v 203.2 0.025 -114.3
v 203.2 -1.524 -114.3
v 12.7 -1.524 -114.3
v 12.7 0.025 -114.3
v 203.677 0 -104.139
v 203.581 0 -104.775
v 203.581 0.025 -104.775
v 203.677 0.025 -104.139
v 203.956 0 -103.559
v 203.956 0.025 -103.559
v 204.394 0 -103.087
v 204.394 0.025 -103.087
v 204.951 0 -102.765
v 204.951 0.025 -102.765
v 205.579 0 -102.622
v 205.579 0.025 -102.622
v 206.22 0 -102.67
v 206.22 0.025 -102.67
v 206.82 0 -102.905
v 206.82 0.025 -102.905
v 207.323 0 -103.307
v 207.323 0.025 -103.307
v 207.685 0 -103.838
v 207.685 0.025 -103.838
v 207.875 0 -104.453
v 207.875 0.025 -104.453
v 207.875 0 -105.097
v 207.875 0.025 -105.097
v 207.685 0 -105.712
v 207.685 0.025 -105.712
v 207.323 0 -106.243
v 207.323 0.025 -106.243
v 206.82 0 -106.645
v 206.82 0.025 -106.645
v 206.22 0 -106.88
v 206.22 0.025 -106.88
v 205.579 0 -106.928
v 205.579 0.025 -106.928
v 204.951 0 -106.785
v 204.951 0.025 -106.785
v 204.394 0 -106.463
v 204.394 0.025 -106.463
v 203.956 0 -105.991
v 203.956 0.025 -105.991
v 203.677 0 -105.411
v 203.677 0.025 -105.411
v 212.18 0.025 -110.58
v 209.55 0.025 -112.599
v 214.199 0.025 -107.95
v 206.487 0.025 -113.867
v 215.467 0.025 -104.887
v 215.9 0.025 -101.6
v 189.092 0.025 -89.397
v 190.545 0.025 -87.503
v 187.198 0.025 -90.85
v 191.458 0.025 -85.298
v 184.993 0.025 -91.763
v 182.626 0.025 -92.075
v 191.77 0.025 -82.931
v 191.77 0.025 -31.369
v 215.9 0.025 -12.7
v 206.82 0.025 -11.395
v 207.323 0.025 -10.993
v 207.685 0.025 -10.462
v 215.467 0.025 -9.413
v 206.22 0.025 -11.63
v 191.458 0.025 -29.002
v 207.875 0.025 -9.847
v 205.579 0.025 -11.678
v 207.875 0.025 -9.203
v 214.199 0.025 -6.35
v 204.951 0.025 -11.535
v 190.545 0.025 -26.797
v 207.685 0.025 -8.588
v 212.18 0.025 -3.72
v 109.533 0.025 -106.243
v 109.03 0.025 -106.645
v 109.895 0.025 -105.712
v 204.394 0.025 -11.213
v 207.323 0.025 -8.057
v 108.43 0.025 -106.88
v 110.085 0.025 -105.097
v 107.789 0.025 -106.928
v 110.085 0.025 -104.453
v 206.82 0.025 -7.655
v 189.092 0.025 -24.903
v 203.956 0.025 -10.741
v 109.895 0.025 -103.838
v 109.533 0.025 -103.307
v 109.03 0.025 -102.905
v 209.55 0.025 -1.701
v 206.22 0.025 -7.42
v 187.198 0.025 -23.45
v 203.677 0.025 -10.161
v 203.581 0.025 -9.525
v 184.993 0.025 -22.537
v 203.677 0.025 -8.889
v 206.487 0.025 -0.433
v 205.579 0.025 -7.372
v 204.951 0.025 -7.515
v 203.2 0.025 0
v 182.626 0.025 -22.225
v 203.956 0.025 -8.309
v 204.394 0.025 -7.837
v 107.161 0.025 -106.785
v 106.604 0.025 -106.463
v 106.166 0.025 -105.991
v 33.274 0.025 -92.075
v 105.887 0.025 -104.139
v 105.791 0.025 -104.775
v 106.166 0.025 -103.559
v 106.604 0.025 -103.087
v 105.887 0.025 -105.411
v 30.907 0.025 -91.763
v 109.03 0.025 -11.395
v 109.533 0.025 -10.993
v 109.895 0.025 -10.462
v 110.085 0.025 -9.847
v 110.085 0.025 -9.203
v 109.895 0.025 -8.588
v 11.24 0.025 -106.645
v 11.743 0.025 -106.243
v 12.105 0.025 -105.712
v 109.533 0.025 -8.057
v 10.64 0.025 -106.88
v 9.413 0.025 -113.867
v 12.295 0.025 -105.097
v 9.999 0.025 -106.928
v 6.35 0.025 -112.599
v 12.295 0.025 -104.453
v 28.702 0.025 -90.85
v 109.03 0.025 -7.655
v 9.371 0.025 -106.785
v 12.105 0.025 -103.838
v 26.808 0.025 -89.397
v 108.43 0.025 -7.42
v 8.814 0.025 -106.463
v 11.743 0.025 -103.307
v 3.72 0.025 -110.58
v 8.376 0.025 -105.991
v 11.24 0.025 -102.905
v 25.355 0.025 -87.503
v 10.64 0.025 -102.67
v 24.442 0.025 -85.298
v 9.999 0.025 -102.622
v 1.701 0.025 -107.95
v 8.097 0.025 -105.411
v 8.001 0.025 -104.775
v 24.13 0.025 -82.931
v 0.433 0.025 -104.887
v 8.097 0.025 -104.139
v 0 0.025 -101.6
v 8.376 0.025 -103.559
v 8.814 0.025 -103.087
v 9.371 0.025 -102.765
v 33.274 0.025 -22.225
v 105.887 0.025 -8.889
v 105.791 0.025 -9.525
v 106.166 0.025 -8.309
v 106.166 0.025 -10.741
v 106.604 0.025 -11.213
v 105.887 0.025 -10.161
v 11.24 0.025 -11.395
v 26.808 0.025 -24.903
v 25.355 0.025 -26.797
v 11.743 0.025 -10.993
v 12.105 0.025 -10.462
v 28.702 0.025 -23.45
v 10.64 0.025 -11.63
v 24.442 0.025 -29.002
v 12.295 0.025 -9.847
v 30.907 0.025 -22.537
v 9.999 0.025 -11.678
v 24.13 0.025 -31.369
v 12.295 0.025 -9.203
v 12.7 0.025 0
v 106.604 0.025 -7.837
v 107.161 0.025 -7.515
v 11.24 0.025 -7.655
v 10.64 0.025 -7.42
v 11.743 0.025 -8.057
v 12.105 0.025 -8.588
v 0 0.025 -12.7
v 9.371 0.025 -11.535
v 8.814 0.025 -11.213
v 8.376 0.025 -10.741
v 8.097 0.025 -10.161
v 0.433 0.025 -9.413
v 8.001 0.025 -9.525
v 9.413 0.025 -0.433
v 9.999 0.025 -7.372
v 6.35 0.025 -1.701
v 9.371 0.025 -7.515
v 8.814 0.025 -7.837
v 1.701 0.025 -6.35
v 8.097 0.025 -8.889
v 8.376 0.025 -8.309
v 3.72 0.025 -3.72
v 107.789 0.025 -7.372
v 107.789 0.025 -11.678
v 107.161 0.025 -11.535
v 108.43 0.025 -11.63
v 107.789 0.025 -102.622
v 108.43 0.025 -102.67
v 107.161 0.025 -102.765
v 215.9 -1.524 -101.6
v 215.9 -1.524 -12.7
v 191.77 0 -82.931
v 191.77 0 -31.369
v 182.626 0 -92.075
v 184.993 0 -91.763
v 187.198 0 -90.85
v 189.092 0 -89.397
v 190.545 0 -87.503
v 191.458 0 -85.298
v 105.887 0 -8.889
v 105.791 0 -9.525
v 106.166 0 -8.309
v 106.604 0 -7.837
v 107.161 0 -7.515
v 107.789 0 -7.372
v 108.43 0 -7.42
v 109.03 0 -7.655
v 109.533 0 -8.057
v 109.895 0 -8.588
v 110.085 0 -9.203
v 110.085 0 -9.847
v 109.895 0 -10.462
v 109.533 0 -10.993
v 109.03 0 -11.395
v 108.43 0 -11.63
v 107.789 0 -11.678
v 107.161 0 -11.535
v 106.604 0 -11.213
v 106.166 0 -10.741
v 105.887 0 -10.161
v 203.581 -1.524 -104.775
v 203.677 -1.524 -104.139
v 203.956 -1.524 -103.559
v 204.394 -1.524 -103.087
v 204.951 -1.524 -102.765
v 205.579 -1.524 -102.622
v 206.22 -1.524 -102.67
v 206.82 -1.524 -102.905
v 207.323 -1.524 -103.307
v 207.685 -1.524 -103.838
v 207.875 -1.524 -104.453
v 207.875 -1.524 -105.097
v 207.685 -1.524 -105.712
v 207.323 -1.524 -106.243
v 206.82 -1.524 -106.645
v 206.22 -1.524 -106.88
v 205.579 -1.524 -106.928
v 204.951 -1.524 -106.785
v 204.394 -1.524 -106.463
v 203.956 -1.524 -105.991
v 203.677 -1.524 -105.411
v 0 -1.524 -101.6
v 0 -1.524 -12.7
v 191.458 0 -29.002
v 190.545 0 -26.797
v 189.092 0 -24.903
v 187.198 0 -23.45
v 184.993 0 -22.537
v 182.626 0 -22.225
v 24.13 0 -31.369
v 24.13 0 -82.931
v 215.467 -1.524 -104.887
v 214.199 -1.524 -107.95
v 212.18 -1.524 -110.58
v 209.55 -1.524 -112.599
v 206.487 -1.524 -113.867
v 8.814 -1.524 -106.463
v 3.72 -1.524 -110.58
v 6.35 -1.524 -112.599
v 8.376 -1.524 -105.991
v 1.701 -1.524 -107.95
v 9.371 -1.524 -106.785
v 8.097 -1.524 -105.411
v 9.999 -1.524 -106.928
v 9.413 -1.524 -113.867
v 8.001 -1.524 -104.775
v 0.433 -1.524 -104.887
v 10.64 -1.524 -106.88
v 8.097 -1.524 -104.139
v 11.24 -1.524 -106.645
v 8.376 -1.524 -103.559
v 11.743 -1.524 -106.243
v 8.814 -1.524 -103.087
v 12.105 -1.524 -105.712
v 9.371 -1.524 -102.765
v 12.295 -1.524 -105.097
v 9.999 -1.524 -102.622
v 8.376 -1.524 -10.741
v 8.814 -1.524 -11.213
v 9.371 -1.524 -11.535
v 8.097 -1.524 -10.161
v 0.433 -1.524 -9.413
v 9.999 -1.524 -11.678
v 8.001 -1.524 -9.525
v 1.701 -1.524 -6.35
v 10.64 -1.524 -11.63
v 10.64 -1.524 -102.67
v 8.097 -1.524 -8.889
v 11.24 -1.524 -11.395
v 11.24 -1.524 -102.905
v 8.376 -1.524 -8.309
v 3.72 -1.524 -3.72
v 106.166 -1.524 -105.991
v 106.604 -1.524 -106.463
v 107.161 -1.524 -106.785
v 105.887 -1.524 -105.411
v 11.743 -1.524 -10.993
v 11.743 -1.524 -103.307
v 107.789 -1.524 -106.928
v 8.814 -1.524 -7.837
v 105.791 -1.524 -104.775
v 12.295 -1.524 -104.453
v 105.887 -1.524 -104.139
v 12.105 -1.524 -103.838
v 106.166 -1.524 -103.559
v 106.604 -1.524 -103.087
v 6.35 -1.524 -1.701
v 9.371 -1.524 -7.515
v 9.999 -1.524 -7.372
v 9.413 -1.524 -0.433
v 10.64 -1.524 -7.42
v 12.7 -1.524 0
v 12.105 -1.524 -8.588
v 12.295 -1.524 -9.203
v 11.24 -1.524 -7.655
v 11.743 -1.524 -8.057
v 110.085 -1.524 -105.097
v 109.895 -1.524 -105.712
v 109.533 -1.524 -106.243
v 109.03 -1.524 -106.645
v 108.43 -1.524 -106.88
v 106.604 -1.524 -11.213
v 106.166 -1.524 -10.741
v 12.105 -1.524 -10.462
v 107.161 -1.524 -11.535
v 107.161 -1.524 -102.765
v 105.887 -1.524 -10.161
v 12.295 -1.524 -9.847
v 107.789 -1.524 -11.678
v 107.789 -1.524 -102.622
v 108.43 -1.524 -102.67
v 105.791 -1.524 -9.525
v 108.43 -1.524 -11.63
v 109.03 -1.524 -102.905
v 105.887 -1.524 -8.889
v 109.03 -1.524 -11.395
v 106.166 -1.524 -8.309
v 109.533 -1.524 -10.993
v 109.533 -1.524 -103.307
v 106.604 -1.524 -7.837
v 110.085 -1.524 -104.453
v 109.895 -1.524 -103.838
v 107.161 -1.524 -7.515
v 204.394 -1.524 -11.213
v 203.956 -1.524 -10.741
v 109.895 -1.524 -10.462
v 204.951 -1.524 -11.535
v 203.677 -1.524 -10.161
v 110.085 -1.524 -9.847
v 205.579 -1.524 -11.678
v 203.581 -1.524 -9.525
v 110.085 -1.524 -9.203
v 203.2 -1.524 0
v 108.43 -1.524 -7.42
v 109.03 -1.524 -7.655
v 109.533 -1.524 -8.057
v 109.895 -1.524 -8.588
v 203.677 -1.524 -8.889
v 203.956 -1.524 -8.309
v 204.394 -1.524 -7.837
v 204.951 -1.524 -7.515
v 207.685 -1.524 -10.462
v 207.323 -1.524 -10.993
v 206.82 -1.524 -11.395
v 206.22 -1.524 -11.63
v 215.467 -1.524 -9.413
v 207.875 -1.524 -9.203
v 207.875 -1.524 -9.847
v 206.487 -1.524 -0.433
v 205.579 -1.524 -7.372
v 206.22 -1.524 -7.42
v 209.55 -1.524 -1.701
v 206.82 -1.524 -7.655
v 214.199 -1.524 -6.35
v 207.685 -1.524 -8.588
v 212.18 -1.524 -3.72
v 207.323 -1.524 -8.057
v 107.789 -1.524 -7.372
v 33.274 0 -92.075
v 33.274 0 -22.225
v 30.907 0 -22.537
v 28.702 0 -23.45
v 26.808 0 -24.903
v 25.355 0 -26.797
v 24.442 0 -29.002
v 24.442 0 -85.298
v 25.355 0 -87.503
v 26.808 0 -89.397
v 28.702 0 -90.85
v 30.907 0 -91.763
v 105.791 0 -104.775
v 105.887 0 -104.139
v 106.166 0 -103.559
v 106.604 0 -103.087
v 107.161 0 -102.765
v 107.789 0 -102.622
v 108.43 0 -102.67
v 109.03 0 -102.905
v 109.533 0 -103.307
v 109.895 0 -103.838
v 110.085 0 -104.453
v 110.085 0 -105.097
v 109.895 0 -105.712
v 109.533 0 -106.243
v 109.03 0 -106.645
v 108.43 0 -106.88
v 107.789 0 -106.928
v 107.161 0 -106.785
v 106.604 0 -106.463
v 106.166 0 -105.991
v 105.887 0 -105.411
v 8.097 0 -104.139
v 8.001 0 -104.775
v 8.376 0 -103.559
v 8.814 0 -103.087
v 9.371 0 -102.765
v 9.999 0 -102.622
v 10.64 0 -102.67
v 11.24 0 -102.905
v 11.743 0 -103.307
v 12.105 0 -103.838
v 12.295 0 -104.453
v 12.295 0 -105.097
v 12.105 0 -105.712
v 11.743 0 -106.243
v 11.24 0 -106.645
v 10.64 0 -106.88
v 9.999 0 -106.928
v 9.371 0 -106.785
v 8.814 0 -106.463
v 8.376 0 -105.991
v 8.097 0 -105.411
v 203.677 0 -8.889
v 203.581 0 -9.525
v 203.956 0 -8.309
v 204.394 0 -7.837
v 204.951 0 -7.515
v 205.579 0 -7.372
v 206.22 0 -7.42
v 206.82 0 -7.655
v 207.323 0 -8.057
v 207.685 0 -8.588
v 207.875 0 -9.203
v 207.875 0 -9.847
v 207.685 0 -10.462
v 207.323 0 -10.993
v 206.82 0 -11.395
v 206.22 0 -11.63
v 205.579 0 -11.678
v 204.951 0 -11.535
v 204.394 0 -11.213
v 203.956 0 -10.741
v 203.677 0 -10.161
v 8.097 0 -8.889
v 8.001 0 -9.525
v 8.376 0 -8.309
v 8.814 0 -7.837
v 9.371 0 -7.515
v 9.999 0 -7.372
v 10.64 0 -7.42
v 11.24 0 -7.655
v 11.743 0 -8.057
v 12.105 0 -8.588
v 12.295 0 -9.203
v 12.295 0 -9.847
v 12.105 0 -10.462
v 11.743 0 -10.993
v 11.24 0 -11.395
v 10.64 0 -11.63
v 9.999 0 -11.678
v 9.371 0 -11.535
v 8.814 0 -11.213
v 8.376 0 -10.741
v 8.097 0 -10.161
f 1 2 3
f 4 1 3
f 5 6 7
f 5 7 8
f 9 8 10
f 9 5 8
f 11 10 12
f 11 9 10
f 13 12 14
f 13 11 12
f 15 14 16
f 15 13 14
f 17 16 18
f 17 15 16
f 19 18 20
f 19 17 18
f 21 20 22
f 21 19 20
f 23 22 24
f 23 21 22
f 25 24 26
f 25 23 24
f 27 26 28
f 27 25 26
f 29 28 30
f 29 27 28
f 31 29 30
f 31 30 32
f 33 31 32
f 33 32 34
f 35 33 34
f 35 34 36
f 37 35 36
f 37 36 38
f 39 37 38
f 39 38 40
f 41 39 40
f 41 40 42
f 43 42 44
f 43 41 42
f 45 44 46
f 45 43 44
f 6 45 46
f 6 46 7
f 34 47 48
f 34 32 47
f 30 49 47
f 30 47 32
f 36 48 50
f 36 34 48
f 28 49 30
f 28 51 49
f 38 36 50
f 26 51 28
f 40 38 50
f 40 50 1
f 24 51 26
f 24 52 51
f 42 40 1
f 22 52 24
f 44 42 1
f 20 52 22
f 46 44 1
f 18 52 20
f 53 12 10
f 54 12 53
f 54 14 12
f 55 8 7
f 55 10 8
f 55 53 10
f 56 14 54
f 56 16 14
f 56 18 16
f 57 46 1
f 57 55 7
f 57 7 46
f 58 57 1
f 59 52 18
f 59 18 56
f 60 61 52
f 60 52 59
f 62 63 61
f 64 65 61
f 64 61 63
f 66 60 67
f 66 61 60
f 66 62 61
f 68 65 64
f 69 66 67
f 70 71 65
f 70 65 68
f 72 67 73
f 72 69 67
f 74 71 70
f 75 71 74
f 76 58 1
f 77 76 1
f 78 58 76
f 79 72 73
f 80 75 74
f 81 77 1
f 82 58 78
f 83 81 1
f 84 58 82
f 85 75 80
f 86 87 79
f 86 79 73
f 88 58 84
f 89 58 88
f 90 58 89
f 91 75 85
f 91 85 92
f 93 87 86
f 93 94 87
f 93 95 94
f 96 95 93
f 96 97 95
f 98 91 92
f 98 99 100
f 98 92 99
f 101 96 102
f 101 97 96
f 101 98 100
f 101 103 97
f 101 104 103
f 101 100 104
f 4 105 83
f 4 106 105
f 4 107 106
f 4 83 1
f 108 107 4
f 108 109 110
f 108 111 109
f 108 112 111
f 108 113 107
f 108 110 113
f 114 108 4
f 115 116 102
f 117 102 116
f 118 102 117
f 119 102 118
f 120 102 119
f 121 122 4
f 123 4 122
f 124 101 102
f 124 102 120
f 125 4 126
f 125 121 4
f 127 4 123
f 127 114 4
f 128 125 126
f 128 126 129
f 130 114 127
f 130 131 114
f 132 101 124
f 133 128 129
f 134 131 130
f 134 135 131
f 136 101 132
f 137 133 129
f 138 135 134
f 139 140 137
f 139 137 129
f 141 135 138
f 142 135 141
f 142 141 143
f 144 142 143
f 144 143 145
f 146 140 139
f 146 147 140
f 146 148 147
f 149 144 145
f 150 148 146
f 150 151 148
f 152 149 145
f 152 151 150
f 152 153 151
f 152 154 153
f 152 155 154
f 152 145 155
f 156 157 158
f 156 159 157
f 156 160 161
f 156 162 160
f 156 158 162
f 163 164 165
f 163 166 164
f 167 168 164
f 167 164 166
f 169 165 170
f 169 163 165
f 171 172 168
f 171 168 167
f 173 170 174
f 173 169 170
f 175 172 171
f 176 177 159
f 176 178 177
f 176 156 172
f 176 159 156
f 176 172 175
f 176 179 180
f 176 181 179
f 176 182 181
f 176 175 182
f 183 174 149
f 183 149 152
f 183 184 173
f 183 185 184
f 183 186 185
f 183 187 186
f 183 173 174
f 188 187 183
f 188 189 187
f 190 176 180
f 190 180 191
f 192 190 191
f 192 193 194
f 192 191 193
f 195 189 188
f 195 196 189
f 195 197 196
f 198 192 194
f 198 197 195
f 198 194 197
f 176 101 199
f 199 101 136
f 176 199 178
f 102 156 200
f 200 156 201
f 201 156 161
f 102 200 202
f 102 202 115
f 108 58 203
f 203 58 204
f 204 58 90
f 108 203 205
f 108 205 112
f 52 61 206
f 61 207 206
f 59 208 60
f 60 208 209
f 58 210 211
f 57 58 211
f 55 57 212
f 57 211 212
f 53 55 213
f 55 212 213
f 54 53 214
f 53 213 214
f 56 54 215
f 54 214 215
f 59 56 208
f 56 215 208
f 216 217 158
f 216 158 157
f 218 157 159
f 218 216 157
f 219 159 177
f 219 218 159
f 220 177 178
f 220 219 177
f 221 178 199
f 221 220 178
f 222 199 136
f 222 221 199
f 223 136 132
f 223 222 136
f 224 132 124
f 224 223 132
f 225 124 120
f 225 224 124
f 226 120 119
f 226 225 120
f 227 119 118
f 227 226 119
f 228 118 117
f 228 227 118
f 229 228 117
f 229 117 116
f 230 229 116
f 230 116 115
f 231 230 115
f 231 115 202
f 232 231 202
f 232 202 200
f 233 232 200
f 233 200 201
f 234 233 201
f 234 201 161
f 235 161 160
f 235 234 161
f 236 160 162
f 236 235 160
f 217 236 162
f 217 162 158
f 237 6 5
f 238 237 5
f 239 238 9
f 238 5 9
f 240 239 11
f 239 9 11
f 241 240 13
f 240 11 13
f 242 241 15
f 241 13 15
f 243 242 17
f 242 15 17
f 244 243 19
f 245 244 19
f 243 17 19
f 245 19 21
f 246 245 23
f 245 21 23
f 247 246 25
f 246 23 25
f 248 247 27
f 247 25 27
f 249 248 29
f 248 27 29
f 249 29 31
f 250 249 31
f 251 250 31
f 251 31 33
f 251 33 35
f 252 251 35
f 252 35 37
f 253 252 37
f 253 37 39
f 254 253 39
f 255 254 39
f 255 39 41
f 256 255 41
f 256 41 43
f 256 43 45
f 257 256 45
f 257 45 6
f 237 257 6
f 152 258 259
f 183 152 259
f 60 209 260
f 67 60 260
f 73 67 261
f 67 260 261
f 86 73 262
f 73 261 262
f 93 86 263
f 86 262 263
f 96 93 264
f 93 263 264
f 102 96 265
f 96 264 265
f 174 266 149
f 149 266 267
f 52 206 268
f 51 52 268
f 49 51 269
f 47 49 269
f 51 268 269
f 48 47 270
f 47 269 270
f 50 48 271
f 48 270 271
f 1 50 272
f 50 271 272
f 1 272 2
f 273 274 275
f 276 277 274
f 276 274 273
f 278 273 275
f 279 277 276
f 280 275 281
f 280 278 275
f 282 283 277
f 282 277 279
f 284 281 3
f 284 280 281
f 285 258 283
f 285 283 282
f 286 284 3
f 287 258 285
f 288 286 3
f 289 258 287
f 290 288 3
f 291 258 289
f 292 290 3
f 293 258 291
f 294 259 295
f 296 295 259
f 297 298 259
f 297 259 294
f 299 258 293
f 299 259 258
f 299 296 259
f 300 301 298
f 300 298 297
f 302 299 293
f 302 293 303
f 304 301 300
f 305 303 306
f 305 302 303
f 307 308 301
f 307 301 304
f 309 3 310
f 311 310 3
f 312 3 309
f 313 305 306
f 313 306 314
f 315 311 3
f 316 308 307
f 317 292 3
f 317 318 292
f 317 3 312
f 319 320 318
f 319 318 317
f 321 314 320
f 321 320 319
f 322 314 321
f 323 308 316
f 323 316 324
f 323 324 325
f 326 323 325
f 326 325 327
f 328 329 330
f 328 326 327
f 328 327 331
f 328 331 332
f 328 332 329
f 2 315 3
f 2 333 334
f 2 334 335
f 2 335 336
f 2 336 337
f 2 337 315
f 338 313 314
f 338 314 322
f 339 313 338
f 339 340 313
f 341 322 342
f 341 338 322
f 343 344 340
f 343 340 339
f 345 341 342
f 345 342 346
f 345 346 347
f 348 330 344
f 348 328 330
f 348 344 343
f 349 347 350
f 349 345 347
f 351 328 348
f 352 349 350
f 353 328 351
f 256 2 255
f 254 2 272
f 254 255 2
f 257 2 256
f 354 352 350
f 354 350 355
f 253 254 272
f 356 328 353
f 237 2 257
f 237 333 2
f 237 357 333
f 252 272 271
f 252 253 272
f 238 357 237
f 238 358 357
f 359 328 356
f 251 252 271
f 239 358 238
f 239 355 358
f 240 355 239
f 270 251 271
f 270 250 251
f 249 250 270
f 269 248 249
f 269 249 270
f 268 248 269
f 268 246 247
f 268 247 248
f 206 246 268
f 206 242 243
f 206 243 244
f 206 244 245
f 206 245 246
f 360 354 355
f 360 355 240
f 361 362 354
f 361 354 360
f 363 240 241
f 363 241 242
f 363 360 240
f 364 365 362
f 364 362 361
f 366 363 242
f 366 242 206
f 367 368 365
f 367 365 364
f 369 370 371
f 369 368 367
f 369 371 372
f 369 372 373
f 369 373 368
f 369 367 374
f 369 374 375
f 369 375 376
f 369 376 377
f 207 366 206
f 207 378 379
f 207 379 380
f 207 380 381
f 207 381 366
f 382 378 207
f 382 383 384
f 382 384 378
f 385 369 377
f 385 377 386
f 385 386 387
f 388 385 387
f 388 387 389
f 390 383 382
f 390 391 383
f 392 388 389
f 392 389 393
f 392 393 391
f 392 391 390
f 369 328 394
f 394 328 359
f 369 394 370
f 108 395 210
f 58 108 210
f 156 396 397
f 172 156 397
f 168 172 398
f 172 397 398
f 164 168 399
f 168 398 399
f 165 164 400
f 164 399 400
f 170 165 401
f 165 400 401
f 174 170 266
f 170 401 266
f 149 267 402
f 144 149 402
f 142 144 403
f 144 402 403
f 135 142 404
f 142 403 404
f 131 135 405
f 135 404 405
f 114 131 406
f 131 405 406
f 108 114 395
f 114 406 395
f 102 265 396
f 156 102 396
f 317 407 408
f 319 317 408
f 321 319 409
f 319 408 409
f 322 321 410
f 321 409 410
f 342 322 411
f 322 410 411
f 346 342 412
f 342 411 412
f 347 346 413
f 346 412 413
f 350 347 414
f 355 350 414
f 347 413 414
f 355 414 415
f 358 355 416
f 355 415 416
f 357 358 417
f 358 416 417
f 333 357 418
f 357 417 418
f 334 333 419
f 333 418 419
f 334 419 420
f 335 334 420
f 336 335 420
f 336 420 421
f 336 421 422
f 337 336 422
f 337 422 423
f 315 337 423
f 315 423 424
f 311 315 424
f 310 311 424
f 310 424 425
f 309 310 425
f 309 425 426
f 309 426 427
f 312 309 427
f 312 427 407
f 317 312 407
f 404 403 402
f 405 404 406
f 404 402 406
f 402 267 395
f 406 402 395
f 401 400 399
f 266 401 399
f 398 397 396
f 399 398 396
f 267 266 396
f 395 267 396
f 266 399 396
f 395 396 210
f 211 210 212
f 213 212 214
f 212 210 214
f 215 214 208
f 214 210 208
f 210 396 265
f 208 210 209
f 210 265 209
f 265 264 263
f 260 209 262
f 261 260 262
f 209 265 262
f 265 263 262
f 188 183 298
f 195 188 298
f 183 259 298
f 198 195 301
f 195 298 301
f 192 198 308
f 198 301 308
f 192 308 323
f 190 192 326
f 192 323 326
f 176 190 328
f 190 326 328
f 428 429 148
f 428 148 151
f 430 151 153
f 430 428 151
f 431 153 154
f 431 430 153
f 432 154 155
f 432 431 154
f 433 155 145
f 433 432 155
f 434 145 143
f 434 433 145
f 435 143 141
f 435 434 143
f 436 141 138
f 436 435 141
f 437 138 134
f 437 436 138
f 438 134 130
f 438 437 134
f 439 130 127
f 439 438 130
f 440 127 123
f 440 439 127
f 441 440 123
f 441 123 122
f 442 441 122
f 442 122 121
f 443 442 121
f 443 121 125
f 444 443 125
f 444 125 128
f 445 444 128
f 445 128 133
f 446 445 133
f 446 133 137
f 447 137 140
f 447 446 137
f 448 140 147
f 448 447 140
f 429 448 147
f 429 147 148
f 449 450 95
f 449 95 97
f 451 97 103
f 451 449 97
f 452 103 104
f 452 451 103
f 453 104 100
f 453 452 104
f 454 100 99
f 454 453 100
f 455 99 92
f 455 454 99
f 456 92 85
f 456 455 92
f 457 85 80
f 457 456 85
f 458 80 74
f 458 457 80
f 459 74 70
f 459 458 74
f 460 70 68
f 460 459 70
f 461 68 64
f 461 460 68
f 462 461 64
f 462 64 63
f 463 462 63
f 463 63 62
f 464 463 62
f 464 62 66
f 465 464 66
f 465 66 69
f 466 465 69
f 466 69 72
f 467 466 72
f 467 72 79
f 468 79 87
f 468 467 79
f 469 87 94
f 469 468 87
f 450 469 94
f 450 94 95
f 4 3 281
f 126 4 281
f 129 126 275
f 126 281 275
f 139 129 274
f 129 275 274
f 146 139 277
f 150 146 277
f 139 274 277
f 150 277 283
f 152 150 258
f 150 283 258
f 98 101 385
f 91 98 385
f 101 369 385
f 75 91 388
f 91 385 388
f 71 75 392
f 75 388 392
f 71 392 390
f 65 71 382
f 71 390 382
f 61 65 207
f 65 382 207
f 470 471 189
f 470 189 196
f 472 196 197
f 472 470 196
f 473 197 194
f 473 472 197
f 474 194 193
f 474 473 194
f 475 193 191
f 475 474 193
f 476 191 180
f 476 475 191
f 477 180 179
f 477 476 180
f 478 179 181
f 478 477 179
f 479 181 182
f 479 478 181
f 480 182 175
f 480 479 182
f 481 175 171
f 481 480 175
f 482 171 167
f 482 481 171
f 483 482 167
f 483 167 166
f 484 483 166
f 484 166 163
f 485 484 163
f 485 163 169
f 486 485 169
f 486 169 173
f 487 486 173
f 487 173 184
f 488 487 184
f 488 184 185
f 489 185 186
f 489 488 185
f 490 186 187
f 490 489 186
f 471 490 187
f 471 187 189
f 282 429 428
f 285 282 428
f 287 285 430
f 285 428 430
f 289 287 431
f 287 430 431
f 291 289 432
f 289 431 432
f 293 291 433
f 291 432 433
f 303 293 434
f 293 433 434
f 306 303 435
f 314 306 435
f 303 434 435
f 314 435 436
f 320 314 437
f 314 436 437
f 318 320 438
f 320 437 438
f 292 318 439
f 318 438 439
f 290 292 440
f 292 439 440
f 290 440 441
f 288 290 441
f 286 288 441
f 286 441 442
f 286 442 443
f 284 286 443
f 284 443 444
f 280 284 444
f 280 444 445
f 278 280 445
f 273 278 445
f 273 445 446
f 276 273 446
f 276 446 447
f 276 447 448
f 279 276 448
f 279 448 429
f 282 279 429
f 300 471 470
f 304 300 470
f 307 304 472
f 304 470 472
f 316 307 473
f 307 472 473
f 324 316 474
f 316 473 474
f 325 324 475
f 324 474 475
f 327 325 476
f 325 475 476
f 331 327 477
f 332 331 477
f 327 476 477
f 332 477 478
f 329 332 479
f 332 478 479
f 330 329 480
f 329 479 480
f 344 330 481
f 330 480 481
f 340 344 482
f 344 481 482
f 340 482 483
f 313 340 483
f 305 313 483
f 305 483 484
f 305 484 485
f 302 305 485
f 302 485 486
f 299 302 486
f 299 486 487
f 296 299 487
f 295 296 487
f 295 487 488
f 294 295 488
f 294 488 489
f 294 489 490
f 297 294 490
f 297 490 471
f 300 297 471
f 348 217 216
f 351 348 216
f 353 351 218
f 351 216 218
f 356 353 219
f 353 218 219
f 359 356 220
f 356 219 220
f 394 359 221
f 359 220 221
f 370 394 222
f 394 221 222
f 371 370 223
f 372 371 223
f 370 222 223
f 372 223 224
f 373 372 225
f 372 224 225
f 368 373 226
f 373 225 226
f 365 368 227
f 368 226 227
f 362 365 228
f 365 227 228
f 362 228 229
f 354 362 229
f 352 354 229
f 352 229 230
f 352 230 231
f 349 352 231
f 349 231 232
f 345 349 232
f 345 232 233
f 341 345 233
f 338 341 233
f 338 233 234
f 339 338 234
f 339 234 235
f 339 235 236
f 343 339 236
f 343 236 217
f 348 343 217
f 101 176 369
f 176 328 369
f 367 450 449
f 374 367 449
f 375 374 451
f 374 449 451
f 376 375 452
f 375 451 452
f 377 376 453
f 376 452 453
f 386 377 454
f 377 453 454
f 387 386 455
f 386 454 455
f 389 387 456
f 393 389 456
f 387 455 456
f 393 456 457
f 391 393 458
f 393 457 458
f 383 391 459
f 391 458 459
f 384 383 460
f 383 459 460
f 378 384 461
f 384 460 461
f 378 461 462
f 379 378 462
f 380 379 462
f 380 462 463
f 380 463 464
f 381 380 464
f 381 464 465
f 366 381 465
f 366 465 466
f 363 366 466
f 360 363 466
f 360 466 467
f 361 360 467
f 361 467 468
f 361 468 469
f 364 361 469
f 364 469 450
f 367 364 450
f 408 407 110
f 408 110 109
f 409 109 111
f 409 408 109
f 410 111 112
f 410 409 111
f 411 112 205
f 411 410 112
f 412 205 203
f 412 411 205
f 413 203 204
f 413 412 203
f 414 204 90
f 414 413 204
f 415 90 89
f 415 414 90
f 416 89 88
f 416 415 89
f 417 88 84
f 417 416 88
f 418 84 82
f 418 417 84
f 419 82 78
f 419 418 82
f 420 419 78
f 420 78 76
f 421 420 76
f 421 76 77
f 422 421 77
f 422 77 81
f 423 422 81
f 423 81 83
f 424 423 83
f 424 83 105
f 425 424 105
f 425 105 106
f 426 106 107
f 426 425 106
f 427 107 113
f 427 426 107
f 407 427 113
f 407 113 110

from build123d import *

# Parameters (mm, degrees)
F1_DEPTH = 1.524
F3_D     = 4.318
F4_R     = 2.159
F5_DEPTH = 0.0254


with BuildPart() as f1:
    # F0 (on Front) → F1 (new body)
    with BuildSketch(Plane.XZ):
        with BuildLine():
            Line((203.2, 0), (12.7, 0))
            ThreePointArc((12.7, 0), (3.7197438789, -3.7197438789), (0, -12.7))
            Line((0, -12.7), (0, -101.6))
            ThreePointArc((0, -101.6), (3.7197438789, -110.5802561211), (12.7, -114.3))
            Line((12.7, -114.3), (203.2, -114.3))
            ThreePointArc((203.2, -114.3), (212.1802561211, -110.5802561211), (215.9, -101.6))
            Line((215.9, -101.6), (215.9, -12.7))
            ThreePointArc((215.9, -12.7), (212.1802561211, -3.7197438789), (203.2, 0))
        make_face()
    extrude(amount=F1_DEPTH)

    # F3 (through all)
    with Locations(Plane.XZ.offset(1.524)):
        with Locations((10.16, -9.525), (107.95, -9.525), (205.74, -9.525), (205.74, -104.775), (107.95, -104.775), (10.16, -104.775)):
            Hole(F3_D / 2)

    # F4 (on face) → F5 (join)
    with BuildSketch(Plane(origin=(0, 0, 0), x_dir=(-1, 0, 0), z_dir=(0, 1, 0))):
        with BuildLine():
            Line((0, -101.6), (0, -12.7))
            ThreePointArc((0, -12.7), (-3.7197438789, -3.7197438789), (-12.7, 0))
            Line((-12.7, 0), (-203.2, 0))
            ThreePointArc((-203.2, 0), (-212.1802561211, -3.7197438789), (-215.9, -12.7))
            Line((-215.9, -12.7), (-215.9, -101.6))
            ThreePointArc((-215.9, -101.6), (-212.1802561211, -110.5802561211), (-203.2, -114.3))
            Line((-203.2, -114.3), (-12.7, -114.3))
            ThreePointArc((-12.7, -114.3), (-3.7197438789, -110.5802561211), (0, -101.6))
        make_face()
        with Locations((-205.74, -104.775)):
            Circle(F4_R, mode=Mode.SUBTRACT)
        with Locations((-107.95, -104.775)):
            Circle(F4_R, mode=Mode.SUBTRACT)
        with Locations((-10.16, -104.775)):
            Circle(F4_R, mode=Mode.SUBTRACT)
        with BuildLine():
            Line((-182.626, -22.225), (-33.274, -22.225))
            ThreePointArc((-33.274, -22.225), (-26.8082155928, -24.9032155928), (-24.13, -31.369))
            Line((-24.13, -31.369), (-24.13, -82.931))
            ThreePointArc((-24.13, -82.931), (-26.8082155928, -89.3967844072), (-33.274, -92.075))
            Line((-33.274, -92.075), (-182.626, -92.075))
            ThreePointArc((-182.626, -92.075), (-189.0917844072, -89.3967844072), (-191.77, -82.931))
            Line((-191.77, -82.931), (-191.77, -31.369))
            ThreePointArc((-191.77, -31.369), (-189.0917844072, -24.9032155928), (-182.626, -22.225))
        make_face(mode=Mode.SUBTRACT)
        with Locations((-205.74, -9.525)):
            Circle(F4_R, mode=Mode.SUBTRACT)
        with Locations((-107.95, -9.525)):
            Circle(F4_R, mode=Mode.SUBTRACT)
        with Locations((-10.16, -9.525)):
            Circle(F4_R, mode=Mode.SUBTRACT)
    extrude(amount=F5_DEPTH)


solid = f1.part
